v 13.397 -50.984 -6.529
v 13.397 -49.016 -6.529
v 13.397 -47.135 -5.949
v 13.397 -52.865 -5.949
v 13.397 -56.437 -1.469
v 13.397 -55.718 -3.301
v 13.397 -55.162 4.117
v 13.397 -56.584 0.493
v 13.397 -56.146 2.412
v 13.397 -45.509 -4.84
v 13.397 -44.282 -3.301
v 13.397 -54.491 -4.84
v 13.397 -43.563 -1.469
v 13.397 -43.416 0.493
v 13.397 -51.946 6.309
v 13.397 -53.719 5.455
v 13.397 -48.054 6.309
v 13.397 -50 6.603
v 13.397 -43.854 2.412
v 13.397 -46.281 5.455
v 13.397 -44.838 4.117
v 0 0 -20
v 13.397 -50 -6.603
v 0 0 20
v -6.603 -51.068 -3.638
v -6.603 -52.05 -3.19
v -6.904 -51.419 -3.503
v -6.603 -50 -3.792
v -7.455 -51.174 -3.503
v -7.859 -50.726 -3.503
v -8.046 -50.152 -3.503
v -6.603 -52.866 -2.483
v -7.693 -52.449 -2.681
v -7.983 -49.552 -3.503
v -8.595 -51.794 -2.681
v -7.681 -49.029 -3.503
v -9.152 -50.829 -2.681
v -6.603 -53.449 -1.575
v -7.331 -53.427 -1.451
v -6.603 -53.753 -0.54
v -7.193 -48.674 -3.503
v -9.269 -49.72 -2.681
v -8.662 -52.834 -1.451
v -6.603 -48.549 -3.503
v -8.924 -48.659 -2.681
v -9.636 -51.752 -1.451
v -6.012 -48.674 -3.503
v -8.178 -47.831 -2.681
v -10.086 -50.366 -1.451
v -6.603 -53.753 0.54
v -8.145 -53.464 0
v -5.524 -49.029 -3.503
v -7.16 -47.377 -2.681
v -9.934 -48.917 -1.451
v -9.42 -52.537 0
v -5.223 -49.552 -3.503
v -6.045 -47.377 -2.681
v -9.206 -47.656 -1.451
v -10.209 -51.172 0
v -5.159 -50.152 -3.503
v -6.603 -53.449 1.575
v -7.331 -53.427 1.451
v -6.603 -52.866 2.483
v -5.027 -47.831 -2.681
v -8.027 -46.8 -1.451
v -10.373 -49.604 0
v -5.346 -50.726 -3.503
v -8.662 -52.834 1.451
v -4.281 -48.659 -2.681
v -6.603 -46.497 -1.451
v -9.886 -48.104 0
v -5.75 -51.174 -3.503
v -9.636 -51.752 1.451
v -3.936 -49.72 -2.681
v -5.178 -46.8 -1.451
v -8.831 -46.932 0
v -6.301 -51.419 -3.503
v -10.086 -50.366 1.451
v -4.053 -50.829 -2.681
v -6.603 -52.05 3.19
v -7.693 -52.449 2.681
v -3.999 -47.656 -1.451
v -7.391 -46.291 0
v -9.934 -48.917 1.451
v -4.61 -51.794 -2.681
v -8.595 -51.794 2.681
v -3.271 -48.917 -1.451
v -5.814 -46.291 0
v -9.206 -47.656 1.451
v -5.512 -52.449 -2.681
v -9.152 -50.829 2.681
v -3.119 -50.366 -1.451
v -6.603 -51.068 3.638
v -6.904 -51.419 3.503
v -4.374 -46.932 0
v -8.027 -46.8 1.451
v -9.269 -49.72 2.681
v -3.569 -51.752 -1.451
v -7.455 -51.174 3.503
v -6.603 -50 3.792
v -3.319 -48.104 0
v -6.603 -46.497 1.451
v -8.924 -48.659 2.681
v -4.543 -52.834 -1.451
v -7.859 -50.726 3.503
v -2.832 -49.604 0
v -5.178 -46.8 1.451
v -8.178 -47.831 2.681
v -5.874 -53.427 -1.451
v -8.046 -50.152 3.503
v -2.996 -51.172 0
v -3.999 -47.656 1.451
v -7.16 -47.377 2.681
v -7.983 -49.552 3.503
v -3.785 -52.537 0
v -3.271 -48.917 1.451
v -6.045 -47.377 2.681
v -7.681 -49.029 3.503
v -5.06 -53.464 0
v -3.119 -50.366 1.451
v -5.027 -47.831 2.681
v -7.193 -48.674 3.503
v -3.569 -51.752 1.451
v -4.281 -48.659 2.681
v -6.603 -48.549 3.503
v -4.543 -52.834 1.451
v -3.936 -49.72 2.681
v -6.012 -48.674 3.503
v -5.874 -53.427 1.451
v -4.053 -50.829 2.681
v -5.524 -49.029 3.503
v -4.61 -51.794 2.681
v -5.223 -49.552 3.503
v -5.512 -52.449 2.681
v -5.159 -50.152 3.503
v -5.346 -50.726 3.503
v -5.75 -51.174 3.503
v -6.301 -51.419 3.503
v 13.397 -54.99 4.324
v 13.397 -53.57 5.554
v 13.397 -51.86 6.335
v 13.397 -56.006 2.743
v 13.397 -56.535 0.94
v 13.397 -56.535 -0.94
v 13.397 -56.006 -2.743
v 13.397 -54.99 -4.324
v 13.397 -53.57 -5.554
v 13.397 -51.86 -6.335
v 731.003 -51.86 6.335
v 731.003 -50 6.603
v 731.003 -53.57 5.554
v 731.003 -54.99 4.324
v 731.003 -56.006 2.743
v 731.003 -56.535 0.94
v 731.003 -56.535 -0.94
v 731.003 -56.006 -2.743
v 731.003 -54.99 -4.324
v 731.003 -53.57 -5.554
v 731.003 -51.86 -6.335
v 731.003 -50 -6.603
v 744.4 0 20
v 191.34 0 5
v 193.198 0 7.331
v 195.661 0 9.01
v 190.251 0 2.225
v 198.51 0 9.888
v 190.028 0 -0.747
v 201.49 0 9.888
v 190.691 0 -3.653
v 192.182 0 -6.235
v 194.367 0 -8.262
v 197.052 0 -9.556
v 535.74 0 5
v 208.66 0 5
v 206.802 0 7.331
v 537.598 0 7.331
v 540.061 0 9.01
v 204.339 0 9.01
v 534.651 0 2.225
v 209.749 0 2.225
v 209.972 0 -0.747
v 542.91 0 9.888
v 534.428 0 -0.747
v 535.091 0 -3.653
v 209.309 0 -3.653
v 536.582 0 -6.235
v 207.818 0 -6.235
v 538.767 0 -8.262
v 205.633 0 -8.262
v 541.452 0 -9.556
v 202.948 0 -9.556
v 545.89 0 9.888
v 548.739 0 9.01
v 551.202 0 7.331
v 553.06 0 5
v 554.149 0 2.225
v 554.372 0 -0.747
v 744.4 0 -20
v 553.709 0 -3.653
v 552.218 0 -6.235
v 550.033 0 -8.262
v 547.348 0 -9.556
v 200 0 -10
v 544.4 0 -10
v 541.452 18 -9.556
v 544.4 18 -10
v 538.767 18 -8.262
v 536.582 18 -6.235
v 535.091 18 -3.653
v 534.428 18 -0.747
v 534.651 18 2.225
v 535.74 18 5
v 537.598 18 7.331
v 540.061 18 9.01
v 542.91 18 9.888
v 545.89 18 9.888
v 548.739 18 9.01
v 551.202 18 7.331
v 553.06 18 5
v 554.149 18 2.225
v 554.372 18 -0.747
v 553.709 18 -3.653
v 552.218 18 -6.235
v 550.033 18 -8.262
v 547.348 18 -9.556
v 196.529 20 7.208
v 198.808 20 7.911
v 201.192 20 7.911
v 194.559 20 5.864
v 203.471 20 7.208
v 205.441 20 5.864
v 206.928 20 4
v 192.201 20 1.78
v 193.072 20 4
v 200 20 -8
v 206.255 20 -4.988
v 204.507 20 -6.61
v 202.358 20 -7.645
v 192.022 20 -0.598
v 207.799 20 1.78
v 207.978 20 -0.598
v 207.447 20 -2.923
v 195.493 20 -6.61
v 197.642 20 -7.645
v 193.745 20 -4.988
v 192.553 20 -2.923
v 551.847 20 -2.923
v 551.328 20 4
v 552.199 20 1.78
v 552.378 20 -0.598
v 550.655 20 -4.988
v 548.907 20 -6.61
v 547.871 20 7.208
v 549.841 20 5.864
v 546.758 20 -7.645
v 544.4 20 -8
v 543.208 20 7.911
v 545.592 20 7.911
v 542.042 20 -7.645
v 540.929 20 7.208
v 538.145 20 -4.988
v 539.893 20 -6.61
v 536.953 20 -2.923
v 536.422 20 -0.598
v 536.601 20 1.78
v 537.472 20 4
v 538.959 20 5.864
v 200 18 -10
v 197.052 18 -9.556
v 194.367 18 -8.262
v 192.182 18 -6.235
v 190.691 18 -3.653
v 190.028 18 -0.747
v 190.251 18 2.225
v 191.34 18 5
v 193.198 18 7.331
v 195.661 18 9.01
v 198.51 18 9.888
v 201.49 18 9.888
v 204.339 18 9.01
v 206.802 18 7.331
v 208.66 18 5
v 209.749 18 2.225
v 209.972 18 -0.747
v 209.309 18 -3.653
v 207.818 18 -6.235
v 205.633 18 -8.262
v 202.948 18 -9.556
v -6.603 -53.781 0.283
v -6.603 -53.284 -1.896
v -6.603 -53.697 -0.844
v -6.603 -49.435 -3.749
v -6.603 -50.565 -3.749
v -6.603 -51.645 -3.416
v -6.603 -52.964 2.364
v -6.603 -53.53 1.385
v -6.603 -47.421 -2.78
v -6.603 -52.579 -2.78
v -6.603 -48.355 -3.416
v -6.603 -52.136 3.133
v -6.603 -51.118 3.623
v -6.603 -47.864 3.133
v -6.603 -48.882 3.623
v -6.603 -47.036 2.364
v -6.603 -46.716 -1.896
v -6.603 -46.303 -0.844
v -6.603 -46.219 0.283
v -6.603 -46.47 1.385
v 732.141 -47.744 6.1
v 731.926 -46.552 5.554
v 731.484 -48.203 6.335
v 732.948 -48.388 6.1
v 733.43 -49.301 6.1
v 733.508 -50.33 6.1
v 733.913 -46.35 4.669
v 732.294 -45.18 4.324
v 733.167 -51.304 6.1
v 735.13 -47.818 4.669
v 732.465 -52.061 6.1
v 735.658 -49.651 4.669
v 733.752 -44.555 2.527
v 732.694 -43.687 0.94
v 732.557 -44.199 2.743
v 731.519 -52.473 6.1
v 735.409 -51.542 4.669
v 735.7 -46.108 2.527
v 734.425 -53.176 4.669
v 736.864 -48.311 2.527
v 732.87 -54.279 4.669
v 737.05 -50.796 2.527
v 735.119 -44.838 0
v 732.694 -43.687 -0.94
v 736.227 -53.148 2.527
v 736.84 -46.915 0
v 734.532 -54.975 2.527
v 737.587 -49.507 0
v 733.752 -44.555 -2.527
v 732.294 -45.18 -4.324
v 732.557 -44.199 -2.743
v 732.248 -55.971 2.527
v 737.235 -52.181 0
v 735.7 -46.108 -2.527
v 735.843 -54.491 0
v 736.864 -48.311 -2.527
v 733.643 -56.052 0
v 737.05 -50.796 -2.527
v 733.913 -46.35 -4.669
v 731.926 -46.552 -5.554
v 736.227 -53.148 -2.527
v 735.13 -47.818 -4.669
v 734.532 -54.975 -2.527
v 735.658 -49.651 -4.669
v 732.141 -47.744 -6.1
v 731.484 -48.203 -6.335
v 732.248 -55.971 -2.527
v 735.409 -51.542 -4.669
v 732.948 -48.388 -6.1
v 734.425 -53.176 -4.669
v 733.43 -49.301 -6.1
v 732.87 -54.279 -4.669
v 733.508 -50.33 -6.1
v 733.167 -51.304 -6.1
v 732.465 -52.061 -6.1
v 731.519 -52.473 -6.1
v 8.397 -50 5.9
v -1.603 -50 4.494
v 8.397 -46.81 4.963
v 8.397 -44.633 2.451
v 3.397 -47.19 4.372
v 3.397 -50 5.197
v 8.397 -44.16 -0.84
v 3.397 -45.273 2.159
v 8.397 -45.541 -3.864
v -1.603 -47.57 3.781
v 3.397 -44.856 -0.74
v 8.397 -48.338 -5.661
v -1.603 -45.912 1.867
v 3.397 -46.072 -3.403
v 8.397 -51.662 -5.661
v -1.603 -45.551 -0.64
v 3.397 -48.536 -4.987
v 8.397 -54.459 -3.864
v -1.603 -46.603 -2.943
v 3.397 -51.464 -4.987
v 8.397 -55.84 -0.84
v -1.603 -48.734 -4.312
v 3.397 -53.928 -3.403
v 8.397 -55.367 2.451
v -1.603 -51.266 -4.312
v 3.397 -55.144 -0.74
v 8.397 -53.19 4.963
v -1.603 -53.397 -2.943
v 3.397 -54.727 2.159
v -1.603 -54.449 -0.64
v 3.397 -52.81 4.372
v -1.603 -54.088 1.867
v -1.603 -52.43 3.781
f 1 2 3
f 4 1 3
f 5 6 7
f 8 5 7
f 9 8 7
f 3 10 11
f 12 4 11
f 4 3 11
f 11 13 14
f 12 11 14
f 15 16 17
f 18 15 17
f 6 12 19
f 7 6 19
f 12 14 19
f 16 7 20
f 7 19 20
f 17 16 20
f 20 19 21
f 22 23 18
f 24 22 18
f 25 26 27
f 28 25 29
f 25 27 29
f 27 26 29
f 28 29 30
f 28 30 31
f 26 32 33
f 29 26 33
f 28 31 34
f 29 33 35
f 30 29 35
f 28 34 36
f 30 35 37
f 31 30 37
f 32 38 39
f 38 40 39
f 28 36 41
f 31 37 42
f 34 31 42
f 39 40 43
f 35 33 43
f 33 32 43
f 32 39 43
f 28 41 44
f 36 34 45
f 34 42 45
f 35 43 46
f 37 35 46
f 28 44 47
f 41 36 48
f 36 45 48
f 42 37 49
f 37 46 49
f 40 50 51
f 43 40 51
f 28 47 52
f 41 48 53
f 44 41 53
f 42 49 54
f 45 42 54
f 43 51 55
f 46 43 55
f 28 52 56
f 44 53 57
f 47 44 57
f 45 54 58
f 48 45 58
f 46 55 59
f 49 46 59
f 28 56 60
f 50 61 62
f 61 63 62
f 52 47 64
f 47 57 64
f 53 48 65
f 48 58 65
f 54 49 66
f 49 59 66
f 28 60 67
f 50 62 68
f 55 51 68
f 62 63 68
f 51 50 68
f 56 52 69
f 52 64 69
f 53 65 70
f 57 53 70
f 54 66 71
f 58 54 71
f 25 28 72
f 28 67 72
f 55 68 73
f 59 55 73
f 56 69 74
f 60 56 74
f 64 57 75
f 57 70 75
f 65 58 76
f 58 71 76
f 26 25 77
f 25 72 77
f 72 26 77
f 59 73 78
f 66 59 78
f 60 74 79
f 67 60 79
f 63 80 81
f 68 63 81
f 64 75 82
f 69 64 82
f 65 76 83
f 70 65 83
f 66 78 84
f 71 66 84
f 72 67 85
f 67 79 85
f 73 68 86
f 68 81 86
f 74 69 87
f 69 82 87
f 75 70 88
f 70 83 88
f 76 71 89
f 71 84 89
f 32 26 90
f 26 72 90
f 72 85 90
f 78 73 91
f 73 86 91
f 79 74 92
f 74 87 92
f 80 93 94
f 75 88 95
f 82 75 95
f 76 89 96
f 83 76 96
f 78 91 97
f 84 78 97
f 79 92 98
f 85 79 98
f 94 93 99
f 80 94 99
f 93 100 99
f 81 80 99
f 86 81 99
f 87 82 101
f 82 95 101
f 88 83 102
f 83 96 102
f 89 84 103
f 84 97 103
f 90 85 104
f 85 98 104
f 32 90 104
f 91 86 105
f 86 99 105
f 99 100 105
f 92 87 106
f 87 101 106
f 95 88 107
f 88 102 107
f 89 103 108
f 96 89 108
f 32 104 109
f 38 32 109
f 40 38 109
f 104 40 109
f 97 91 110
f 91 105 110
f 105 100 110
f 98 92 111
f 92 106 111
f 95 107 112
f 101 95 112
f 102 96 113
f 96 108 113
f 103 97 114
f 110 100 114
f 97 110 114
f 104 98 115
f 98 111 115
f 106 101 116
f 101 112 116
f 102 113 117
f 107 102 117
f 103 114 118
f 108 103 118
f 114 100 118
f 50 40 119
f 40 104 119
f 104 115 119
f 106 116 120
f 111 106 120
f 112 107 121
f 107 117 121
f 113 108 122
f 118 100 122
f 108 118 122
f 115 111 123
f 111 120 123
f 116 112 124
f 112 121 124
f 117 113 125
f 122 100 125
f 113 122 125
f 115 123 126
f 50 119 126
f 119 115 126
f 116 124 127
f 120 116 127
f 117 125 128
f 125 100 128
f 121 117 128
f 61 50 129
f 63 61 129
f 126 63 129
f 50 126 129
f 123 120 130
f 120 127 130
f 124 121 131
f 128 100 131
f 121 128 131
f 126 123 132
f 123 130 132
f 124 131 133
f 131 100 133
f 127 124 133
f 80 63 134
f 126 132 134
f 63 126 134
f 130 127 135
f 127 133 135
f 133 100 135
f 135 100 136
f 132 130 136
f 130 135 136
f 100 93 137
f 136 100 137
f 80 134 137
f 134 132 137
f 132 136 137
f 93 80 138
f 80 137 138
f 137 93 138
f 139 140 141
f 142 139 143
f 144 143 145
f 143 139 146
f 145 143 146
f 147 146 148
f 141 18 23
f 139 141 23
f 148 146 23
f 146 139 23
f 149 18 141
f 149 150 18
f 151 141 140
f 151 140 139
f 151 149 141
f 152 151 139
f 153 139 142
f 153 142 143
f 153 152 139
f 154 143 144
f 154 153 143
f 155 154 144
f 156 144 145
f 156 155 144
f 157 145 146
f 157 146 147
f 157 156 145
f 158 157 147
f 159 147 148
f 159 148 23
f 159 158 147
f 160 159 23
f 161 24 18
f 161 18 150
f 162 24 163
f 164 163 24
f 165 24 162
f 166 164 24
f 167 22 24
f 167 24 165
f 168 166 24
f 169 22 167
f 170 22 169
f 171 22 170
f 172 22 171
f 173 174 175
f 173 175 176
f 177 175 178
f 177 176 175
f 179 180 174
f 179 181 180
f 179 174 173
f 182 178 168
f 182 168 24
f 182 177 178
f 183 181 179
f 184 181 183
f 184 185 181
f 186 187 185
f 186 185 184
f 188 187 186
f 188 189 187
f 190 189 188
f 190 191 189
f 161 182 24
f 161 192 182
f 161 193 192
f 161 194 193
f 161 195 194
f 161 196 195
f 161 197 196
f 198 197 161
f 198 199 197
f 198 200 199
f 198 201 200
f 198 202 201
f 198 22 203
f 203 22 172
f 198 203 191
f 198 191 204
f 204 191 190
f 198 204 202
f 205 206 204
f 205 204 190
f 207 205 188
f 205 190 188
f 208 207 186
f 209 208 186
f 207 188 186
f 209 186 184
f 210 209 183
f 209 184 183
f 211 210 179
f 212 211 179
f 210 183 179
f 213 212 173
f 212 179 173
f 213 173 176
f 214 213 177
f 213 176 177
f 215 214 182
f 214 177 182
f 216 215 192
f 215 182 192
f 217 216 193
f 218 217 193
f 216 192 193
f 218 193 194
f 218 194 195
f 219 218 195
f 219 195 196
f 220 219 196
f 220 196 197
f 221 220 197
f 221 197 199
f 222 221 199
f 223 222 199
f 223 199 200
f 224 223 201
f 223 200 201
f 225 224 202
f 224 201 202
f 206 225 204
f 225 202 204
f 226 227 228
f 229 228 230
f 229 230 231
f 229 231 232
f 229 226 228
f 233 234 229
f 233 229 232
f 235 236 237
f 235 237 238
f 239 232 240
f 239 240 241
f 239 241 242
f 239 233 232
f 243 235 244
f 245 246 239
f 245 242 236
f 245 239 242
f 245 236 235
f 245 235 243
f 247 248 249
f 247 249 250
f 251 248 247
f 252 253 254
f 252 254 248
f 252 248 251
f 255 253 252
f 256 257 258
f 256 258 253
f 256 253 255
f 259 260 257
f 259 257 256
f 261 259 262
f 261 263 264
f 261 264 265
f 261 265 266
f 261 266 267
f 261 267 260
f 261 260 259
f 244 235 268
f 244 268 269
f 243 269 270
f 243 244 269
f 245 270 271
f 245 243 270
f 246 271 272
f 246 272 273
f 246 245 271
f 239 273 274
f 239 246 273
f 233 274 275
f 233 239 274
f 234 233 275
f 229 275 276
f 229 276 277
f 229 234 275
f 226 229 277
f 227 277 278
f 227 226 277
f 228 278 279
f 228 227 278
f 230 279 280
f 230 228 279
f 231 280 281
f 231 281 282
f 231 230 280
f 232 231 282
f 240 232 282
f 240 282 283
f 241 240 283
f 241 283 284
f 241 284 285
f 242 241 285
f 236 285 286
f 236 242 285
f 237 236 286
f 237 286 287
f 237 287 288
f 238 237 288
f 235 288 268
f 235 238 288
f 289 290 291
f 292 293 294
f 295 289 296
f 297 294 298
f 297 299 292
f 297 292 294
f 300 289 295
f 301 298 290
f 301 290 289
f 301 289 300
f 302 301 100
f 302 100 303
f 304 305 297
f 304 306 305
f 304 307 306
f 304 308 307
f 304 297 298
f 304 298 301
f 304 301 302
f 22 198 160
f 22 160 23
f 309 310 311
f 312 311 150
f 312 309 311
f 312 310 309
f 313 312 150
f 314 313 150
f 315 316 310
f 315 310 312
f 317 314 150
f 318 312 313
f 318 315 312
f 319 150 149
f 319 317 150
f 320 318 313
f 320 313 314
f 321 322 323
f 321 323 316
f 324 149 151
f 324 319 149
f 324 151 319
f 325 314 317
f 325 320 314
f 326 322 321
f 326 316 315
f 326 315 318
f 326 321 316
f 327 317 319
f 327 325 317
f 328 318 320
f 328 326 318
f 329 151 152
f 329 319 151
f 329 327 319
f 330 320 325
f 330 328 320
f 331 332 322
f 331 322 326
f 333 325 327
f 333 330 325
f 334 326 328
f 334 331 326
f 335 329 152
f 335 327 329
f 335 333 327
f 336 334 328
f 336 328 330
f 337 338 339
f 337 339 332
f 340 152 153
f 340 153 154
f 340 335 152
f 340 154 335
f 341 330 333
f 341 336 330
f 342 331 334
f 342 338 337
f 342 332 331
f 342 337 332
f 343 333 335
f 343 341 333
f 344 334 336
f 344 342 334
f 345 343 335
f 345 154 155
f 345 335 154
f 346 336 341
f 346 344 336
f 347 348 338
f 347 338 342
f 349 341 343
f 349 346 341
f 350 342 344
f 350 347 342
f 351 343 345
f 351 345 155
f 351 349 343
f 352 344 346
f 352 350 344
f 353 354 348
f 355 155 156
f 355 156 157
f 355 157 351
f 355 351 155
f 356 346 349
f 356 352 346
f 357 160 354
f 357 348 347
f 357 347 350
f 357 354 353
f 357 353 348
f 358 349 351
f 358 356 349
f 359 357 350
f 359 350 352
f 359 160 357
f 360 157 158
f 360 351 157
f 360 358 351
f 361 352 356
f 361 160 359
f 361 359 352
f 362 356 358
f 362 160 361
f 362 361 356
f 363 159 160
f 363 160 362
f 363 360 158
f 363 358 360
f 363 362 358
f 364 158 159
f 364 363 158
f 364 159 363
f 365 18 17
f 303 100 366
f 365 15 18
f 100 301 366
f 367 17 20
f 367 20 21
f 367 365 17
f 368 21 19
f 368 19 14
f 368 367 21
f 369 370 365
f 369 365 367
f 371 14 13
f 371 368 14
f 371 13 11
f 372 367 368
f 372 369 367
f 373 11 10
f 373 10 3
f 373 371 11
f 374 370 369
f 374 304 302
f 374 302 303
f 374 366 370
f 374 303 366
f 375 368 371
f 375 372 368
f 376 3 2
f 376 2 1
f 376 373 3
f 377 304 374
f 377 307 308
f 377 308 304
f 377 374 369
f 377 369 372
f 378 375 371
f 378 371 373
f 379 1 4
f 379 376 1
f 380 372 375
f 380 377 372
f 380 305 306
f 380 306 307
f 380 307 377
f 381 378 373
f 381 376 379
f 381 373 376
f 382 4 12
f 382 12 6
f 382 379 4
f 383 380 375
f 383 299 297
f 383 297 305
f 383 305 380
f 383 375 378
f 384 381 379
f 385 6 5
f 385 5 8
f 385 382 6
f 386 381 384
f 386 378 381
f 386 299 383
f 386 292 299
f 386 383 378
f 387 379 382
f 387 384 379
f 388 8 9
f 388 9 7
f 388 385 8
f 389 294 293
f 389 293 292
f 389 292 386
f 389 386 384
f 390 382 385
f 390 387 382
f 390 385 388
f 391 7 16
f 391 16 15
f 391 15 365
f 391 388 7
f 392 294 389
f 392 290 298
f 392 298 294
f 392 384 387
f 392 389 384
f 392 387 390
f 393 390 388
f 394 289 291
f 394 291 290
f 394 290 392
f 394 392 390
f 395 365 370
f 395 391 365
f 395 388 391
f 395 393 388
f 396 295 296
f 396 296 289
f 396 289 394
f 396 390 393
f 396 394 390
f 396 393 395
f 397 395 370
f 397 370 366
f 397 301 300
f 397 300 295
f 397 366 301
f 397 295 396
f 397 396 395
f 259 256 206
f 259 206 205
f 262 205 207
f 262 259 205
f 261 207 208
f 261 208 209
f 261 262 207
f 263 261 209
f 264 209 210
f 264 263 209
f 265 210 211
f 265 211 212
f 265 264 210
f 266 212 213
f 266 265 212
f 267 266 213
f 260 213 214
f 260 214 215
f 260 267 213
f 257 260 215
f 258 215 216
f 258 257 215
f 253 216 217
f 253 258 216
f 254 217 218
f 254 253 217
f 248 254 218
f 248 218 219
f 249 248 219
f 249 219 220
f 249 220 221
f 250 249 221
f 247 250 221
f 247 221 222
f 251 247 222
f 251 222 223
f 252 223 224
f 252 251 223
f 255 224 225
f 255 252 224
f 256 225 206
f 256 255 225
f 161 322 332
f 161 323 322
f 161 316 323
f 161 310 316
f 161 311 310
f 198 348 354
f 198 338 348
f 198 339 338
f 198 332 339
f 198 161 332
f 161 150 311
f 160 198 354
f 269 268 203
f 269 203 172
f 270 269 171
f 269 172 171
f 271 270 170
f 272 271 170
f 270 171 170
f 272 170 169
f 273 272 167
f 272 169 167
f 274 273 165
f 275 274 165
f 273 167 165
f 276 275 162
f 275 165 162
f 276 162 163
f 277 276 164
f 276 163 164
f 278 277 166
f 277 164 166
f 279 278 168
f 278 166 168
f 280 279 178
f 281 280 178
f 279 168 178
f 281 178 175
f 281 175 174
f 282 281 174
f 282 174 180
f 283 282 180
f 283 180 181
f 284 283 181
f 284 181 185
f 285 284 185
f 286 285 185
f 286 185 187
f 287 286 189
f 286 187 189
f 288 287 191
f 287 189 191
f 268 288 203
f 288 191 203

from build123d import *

# Parameters (mm, degrees)
BOSS_EXTRUDE1_DEPTH = 50
BOSS_EXTRUDE1_DRAFT = -15
SKETCH3_R           = 6.602540378
BOSS_EXTRUDE2_DEPTH = 717.605081
SKETCH4_R           = 6.602540378
BOSS_EXTRUDE3_DEPTH = 20
BOSS_EXTRUDE3_TAPER = 8
SKETCH9_R           = 10
BOSS_EXTRUDE4_DEPTH = 20
CHAMFER1_SIZE       = 2


with BuildPart() as part:
    # Sketch1 → Boss-Extrude1 (with draft: the straight prism first)
    with BuildSketch(Plane(origin=(0, 0, 0), x_dir=(1, 0, 0), z_dir=(0, 1, 0))):
        Polygon((0, 0), (0, -20), (744.4, -20), (744.4, 20), (0, 20), align=None)
    extrude(amount=-BOSS_EXTRUDE1_DEPTH)
    # Boss-Extrude1: the draft: its side faces are tilted about the plane it starts from
    boss_extrude1_sides = [part.faces().sort_by_distance(p)[0] for p in [
        (0, -25, 0),
        (744.4, -25, 0),
        (372.2, -25, -20),
        (372.2, -25, 20),
    ]]
    draft(boss_extrude1_sides, Plane(origin=(0, 0, 0), x_dir=(1, 0, 0), z_dir=(0, 1, 0)), BOSS_EXTRUDE1_DRAFT)

    # Sketch3 → Boss-Extrude2 (add)
    with BuildSketch(Plane(origin=(731.002540378, 0, 0), x_dir=(0, 0, -1), z_dir=(1, 0, 0))):
        with Locations((0, -50)):
            Circle(SKETCH3_R)
    extrude(amount=-BOSS_EXTRUDE2_DEPTH)

    # Sketch8 → Revolve3 (revolve)
    with BuildSketch(Plane(origin=(731.002540378, 0, 0), x_dir=(0, 0, -1), z_dir=(1, 0, 0))):
        with BuildLine():
            Line((6.602540378, -50), (-6.602540378, -50))
            ThreePointArc((-6.602540378, -50), (0, -56.602540378), (6.602540378, -50))
        make_face()
    revolve(axis=Axis((731.002540378, -50, 6.602540378), (0, 0, -1)))

    # Sketch9 → Boss-Extrude4 (add)
    with BuildSketch(Plane(origin=(0, 0, 0), x_dir=(1, 0, 0), z_dir=(0, 1, 0))):
        with Locations(Location((200, 0, 0), (0, 0, 90))):
            Circle(SKETCH9_R)
        with Locations(Location((544.4, 0, 0), (0, 0, 90))):
            Circle(SKETCH9_R)
    extrude(amount=BOSS_EXTRUDE4_DEPTH)

    # Chamfer1
    chamfer1_edges = [part.edges().sort_by_distance(p)[0] for p in [
        (200, 20, 10),
        (544.4, 20, 10),
    ]]
    chamfer(chamfer1_edges, length=CHAMFER1_SIZE)


with BuildPart() as body_2:
    # Sketch4 → Boss-Extrude3 (new body)
    with BuildSketch(Plane.ZY.offset(-13.397459622)):
        with Locations((0, -50)):
            Circle(SKETCH4_R)
    extrude(amount=BOSS_EXTRUDE3_DEPTH, taper=BOSS_EXTRUDE3_TAPER)


with BuildPart() as body_3:
    # Sketch6 → Revolve2 (revolve)
    with BuildSketch(Plane.ZY.offset(6.602540378)):
        with BuildLine():
            Line((3.791723684, -50), (-3.791723684, -50))
            ThreePointArc((-3.791723684, -50), (0, -53.791723684), (3.791723684, -50))
        make_face()
    revolve(axis=Axis((-6.602540378, -50, 3.791723684), (0, 0, -1)))


solid = Compound([part.part, body_2.part, body_3.part])
